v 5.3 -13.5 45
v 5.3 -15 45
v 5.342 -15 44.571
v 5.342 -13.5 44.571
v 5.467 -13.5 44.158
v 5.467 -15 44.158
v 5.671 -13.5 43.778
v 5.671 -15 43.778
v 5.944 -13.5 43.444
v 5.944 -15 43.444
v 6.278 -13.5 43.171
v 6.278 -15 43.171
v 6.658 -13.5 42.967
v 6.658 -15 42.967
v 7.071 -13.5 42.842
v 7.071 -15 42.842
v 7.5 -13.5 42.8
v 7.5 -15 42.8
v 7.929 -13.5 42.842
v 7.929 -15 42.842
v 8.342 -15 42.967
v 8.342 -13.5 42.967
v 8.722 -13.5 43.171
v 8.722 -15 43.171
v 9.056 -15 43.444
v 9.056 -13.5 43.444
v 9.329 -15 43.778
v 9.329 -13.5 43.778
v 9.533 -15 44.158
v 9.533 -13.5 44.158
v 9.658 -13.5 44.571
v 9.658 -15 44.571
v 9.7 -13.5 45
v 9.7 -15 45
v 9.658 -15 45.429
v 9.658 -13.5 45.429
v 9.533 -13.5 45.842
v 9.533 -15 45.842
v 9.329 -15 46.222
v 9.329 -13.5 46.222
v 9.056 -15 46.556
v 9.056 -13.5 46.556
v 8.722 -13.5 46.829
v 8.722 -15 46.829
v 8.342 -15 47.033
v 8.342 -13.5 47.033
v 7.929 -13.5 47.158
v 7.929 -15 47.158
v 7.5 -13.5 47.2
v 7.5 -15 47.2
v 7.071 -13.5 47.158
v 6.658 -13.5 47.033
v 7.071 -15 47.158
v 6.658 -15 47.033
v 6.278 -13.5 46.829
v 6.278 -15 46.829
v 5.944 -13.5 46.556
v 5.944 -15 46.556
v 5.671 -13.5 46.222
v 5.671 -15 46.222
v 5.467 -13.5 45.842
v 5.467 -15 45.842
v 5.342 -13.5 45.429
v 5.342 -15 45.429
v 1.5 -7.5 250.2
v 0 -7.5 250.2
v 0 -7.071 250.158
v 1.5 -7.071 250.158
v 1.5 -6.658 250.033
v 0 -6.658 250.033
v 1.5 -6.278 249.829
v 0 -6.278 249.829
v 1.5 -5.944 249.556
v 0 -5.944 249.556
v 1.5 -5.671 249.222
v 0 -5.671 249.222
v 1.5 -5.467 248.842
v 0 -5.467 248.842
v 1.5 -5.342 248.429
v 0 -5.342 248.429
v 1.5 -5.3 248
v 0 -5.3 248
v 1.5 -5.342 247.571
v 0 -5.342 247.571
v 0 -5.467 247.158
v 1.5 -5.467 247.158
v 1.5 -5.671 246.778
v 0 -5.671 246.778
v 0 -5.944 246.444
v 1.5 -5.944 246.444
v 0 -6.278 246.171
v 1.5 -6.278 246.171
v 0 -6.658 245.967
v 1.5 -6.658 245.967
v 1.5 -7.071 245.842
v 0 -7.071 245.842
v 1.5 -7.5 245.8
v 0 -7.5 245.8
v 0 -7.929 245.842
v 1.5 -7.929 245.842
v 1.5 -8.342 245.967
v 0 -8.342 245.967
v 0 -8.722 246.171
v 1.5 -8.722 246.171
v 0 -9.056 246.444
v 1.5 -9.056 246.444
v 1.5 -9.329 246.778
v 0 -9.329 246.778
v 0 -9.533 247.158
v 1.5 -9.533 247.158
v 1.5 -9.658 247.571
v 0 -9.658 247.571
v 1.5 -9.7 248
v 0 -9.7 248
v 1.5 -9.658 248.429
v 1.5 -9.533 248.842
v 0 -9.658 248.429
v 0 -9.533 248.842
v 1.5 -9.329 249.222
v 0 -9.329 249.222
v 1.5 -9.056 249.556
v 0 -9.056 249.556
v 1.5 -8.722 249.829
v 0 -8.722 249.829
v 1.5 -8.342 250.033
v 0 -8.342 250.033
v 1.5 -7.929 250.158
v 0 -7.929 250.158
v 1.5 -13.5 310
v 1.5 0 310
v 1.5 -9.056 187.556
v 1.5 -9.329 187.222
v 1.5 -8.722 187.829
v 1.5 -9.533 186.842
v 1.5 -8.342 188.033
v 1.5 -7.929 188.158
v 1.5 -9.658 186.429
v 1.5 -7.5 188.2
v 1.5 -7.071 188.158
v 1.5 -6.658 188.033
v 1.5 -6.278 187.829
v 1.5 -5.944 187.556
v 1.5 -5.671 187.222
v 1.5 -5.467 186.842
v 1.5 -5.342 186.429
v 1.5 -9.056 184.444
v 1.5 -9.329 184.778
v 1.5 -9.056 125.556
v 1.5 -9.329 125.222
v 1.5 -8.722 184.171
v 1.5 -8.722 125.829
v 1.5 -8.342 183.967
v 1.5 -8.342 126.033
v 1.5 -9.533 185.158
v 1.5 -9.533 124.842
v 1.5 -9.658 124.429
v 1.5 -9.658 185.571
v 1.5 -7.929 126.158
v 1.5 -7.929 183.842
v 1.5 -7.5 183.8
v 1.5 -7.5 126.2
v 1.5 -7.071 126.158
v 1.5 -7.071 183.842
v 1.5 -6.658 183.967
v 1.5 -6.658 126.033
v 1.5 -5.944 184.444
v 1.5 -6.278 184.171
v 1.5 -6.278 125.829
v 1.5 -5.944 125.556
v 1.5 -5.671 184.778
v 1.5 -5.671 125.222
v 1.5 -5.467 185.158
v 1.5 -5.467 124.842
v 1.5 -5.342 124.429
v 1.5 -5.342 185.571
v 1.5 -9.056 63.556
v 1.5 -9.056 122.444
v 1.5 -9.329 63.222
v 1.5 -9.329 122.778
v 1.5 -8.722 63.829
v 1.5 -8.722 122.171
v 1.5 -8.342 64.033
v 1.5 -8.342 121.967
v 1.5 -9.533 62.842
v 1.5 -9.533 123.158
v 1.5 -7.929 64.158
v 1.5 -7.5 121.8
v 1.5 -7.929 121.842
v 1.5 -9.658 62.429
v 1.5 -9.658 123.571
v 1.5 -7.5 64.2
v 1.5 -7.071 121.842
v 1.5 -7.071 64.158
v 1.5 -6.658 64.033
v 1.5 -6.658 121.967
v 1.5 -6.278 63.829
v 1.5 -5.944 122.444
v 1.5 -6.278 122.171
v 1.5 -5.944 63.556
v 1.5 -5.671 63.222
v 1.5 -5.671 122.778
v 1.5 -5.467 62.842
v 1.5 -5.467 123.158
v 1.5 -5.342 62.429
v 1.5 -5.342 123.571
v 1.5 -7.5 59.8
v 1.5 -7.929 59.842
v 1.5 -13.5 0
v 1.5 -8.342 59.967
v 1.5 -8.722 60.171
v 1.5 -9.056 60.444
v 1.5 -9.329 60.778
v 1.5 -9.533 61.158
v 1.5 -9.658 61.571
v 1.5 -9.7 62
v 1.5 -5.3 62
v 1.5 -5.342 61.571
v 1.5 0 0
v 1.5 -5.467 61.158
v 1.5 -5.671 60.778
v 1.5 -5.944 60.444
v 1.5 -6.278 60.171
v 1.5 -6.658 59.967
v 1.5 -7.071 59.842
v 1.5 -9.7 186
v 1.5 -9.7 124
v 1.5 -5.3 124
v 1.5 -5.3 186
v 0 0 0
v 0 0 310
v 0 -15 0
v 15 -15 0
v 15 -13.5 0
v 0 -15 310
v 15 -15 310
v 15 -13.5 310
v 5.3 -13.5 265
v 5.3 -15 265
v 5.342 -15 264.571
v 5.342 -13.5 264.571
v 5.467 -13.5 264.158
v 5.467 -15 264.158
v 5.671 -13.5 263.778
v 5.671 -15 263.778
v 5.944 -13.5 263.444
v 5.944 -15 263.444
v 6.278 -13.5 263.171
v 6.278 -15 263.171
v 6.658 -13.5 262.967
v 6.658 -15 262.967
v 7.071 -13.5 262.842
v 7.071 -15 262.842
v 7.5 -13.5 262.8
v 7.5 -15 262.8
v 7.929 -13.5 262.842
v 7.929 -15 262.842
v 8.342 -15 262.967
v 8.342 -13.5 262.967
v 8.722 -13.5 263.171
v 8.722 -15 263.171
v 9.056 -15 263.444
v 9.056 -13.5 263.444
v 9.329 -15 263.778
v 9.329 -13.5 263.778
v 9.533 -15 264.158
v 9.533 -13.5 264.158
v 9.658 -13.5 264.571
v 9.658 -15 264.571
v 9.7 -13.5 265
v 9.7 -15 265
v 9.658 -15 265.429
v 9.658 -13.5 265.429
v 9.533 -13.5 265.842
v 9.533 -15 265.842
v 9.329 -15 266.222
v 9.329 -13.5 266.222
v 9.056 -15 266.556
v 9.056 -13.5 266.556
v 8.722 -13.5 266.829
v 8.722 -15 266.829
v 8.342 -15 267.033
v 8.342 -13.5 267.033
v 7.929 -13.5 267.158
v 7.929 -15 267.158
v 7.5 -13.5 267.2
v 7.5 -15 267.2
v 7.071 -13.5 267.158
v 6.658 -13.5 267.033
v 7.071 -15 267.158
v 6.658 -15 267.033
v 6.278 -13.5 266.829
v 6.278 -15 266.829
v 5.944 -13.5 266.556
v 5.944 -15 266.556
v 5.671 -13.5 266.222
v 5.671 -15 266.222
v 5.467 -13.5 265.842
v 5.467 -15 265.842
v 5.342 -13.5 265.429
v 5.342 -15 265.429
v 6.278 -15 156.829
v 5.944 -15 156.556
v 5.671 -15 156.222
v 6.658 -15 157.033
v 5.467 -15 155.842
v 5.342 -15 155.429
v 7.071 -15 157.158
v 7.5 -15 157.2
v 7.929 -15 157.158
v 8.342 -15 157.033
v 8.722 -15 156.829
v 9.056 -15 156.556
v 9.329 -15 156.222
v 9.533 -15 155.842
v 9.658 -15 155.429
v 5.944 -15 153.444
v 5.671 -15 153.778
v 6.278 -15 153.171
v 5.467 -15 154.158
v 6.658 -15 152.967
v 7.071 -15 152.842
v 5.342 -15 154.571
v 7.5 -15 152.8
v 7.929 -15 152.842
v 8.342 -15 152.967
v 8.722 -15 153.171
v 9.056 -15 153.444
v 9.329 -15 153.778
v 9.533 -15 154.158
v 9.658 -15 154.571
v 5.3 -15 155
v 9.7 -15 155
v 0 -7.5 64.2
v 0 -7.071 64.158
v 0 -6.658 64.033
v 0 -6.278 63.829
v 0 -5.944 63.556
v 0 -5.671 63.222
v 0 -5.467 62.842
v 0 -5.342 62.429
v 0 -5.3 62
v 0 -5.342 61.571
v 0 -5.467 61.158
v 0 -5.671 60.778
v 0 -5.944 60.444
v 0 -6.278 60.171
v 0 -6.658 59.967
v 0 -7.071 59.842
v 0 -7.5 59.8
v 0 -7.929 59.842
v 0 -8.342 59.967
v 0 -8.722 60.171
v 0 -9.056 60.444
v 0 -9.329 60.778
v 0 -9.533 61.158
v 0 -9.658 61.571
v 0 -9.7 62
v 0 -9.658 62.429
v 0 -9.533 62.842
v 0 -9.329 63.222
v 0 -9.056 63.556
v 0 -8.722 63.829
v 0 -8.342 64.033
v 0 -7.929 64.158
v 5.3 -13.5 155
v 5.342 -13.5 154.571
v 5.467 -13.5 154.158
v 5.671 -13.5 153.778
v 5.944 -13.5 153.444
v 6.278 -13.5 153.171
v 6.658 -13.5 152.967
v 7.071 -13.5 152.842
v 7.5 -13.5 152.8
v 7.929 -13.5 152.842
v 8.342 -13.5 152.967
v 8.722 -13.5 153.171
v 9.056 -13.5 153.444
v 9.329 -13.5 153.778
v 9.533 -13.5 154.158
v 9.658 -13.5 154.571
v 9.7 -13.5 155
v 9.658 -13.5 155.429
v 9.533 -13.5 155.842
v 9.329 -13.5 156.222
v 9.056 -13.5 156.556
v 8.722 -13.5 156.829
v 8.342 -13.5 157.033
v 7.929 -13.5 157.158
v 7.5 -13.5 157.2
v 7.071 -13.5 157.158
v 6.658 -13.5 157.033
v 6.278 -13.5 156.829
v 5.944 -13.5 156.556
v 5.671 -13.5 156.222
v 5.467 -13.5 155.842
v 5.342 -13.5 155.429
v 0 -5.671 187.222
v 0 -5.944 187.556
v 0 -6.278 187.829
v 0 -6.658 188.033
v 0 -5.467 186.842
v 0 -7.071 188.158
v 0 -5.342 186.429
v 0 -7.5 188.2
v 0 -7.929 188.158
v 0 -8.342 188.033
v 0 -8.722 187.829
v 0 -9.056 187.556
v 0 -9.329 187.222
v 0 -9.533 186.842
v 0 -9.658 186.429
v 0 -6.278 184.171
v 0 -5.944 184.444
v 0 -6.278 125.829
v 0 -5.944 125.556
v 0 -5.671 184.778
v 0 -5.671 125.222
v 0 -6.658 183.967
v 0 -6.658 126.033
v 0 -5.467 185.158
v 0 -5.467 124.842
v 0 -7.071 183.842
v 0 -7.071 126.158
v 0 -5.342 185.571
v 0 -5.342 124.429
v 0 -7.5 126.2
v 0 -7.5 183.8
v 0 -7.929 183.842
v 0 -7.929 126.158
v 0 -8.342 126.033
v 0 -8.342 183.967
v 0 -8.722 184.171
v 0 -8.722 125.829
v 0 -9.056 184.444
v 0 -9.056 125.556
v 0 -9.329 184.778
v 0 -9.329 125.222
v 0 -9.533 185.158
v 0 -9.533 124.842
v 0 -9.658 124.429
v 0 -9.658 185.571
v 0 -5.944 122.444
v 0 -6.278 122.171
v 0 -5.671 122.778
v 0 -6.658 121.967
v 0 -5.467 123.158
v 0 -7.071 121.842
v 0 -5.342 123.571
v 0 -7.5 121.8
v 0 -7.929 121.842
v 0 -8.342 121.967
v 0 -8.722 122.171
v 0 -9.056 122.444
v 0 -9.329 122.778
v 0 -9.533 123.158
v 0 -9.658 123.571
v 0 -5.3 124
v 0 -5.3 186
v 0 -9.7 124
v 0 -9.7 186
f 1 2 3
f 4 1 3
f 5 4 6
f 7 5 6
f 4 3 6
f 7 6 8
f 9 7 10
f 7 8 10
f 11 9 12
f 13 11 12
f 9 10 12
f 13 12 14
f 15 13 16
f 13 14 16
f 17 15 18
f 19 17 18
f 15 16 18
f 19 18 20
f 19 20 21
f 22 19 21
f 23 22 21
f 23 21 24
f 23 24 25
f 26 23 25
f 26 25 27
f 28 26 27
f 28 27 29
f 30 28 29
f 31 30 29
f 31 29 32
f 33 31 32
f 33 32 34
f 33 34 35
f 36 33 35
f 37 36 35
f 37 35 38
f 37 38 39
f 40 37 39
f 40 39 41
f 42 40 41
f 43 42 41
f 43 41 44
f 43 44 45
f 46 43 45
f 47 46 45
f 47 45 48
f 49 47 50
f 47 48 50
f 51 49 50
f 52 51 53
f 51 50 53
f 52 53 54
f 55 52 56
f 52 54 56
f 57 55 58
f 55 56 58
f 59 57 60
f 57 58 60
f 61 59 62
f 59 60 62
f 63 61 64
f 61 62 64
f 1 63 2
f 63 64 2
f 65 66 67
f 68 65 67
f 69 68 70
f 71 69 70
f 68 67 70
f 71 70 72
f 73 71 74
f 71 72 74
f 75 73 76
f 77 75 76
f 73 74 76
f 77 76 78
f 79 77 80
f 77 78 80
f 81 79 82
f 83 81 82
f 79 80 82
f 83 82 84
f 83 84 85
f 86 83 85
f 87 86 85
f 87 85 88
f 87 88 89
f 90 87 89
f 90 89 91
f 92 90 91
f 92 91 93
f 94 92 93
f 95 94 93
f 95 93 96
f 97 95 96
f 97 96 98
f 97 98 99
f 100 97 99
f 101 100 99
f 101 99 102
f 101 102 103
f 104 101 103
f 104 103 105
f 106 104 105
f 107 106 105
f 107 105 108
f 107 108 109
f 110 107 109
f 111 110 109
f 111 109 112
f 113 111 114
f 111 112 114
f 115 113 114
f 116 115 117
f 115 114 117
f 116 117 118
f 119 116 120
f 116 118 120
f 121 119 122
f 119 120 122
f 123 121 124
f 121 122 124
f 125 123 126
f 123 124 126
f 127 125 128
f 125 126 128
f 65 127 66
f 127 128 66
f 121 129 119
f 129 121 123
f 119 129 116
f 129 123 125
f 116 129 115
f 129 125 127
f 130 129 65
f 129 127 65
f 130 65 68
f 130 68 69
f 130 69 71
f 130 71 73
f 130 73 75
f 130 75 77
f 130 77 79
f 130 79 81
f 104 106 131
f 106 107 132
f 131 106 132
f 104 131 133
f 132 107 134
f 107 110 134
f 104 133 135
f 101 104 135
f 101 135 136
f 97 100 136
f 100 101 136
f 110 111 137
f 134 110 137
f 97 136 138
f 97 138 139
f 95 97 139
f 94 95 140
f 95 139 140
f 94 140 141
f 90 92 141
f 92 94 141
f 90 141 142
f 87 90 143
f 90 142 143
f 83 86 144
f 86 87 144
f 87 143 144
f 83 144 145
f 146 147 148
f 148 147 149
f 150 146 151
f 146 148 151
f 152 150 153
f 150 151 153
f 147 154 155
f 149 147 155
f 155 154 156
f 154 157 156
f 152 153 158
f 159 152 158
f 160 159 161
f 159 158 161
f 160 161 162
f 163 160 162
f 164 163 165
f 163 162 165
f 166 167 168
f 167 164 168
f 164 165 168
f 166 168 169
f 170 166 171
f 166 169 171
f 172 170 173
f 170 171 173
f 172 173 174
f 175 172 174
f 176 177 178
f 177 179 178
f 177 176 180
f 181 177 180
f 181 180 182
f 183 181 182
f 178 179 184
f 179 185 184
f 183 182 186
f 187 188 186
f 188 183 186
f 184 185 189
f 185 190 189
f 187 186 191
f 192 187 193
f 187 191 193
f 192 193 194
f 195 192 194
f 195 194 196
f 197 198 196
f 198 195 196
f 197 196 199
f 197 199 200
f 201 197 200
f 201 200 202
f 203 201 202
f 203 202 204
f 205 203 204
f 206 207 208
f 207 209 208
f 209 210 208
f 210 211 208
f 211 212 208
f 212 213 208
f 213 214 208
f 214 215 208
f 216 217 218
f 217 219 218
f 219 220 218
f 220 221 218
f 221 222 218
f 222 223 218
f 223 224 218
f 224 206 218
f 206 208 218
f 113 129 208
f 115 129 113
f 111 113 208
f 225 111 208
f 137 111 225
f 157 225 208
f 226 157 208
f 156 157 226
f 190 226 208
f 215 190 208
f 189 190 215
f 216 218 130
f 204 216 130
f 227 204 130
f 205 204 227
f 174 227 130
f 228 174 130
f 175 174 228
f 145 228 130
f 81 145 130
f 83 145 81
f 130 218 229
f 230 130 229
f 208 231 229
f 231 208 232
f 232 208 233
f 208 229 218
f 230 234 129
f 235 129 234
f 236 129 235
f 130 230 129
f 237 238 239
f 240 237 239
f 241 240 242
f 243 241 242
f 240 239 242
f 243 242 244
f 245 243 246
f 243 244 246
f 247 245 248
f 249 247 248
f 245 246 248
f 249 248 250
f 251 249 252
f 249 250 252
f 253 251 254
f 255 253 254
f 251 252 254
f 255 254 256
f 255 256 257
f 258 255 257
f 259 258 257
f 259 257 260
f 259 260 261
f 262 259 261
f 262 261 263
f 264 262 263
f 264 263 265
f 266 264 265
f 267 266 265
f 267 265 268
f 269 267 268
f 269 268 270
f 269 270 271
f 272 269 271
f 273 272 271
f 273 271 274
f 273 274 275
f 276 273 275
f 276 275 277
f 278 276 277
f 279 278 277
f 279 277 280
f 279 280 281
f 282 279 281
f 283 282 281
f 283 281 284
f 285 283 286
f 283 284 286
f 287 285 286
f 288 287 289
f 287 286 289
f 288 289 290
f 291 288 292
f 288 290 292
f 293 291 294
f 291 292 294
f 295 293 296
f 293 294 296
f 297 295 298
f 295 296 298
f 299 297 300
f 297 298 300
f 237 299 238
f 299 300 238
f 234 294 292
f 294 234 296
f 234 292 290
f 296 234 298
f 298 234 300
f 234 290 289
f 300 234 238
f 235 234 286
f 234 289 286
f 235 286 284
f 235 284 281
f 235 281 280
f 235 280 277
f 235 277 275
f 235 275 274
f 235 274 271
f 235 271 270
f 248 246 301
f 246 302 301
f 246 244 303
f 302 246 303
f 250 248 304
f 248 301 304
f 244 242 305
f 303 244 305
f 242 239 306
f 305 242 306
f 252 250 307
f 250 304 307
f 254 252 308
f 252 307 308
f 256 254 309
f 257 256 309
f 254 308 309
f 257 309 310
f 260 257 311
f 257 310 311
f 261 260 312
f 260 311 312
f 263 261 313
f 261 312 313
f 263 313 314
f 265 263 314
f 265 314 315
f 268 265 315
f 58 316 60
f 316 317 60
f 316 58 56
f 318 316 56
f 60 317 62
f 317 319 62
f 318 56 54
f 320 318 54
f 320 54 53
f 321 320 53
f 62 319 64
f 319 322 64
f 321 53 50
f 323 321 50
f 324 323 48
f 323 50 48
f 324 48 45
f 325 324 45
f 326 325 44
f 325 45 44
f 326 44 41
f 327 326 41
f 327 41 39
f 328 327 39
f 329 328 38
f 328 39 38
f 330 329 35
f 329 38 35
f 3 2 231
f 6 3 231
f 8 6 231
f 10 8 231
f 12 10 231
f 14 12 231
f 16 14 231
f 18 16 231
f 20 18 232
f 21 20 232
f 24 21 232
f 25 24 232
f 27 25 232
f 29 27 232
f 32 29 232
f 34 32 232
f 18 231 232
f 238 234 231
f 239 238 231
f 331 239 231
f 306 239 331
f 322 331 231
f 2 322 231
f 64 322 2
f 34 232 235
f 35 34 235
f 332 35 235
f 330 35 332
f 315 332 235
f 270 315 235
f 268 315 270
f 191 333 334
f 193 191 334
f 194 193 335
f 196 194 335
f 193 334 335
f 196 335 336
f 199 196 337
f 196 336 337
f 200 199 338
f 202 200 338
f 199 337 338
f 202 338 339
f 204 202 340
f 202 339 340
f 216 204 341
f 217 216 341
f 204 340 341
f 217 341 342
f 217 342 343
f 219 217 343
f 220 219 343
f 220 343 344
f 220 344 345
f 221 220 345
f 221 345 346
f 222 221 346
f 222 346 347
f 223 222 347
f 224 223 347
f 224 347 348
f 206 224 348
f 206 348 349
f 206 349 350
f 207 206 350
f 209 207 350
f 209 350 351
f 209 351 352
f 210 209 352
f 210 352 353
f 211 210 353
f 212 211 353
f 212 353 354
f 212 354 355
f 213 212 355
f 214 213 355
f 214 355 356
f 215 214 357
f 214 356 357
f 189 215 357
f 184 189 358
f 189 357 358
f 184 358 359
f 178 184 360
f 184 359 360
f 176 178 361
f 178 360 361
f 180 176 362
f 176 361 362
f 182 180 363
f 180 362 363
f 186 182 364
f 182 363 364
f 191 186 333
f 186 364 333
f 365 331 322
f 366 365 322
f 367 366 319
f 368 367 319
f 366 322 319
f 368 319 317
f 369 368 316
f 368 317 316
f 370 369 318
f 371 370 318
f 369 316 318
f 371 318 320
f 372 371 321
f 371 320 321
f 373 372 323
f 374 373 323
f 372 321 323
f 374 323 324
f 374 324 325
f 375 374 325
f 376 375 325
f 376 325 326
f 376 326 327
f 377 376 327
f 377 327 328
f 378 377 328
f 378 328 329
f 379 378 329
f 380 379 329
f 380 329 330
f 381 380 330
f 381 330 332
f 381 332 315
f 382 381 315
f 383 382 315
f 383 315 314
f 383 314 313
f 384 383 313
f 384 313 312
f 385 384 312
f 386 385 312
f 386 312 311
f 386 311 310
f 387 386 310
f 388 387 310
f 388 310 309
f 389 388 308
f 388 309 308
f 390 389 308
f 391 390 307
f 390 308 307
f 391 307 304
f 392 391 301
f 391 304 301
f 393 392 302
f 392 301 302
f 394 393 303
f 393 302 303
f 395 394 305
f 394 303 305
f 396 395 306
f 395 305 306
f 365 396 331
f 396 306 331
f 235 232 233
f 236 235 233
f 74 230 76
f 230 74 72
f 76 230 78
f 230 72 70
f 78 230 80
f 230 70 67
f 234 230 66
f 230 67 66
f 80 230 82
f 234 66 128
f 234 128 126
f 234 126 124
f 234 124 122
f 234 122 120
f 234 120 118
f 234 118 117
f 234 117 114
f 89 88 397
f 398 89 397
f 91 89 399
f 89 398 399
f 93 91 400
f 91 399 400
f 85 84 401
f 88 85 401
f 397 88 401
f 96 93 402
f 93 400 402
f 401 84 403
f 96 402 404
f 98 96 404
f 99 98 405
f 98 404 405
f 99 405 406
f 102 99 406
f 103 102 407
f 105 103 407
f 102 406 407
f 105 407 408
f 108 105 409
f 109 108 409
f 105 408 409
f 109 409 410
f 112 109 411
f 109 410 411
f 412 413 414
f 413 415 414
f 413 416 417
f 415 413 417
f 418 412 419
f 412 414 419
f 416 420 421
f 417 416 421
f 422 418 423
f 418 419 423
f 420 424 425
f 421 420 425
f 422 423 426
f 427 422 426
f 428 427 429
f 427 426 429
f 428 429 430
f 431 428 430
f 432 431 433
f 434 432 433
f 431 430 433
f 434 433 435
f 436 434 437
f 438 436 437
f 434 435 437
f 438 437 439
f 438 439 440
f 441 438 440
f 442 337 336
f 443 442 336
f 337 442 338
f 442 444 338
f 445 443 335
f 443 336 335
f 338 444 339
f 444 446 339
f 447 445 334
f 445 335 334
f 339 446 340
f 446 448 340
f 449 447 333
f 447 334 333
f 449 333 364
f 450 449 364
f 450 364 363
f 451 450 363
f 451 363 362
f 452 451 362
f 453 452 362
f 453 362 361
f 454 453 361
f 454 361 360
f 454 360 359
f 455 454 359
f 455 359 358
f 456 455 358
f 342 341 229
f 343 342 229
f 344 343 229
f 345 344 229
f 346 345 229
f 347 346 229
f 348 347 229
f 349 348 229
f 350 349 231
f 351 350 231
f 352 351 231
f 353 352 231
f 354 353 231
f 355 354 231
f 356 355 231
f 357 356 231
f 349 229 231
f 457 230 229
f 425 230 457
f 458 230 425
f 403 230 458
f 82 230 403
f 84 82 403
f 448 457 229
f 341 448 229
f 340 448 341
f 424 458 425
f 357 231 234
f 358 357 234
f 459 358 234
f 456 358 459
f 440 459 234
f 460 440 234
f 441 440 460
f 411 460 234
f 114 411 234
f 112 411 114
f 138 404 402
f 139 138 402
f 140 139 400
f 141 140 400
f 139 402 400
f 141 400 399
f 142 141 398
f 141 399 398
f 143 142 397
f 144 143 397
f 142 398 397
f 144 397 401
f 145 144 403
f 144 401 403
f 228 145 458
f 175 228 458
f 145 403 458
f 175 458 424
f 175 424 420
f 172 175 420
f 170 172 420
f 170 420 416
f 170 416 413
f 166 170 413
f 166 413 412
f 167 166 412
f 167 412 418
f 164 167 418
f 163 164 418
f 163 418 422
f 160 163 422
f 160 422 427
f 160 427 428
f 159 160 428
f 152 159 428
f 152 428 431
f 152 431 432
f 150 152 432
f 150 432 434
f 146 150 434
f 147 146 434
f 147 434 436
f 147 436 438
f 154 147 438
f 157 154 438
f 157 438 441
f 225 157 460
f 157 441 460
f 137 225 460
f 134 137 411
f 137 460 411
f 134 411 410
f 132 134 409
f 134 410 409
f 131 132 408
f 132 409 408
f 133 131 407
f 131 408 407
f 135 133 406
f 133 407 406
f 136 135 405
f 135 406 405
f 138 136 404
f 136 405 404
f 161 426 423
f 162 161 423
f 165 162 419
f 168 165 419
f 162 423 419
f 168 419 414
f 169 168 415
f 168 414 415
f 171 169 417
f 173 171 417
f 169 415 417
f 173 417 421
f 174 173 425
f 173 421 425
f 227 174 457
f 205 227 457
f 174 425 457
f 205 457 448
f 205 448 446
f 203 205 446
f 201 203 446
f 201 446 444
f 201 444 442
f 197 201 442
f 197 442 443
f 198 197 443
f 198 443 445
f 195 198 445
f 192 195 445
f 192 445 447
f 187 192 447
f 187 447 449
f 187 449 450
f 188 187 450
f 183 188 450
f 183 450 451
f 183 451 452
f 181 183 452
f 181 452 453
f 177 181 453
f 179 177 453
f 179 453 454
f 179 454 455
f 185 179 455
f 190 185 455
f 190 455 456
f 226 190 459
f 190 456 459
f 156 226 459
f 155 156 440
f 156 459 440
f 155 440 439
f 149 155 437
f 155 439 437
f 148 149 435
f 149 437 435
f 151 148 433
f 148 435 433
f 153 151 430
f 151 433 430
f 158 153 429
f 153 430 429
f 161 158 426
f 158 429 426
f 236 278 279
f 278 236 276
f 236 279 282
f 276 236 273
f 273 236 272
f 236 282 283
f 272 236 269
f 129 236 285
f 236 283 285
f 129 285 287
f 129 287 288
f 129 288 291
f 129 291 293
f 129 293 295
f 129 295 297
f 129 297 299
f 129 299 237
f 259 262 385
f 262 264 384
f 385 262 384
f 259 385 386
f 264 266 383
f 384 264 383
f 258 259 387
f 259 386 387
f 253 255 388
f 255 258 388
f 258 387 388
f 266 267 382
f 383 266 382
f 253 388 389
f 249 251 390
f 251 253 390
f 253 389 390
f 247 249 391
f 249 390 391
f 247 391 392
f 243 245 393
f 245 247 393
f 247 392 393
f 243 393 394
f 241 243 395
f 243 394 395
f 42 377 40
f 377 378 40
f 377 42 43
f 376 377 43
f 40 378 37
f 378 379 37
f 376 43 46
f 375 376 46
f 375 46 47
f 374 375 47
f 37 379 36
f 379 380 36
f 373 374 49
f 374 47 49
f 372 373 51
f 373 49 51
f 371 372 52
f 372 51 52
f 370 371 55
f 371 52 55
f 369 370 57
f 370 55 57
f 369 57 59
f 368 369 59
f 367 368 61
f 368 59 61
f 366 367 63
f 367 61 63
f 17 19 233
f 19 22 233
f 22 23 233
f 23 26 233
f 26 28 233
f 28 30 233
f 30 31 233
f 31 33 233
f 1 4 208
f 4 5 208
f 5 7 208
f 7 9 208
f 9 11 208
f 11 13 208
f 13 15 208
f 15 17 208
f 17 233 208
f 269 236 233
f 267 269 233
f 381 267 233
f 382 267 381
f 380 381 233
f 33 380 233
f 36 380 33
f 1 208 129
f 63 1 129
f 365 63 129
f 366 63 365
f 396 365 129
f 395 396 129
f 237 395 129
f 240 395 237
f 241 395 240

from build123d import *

# Parameters (mm, degrees)
EXTRUDE_1_DEPTH     = 310
SKETCH_2_R          = 2.2
CUT_EXTRUDE_1_DEPTH = 310
SKETCH_3_R          = 2.2
CUT_EXTRUDE_2_DEPTH = 160


with BuildPart() as part:
    # ｽｹｯﾁ1 → ﾎﾞｽ - 押し出し1 (new body)
    with BuildSketch(Plane.XY):
        Polygon((0, 0), (0, -15), (15, -15), (15, -13.5), (1.5, -13.5), (1.5, 0), align=None)
    extrude(amount=EXTRUDE_1_DEPTH)

    # ｽｹｯﾁ2 → ｶｯﾄ - 押し出し1 (cut)
    with BuildSketch(Plane.ZY):
        with Locations((248, -7.5)):
            Circle(SKETCH_2_R)
        with Locations((186, -7.5)):
            Circle(SKETCH_2_R)
        with Locations((124, -7.5)):
            Circle(SKETCH_2_R)
        with Locations((62, -7.5)):
            Circle(SKETCH_2_R)
    extrude(amount=-CUT_EXTRUDE_1_DEPTH, mode=Mode.SUBTRACT)

    # ｽｹｯﾁ3 → ｶｯﾄ - 押し出し2 (cut)
    with BuildSketch(Plane(origin=(0, -15, 0), x_dir=(-1, 0, 0), z_dir=(0, -1, 0))):
        with Locations((-7.5, -265)):
            Circle(SKETCH_3_R)
        with Locations((-7.5, -155)):
            Circle(SKETCH_3_R)
        with Locations((-7.5, -45)):
            Circle(SKETCH_3_R)
    extrude(amount=-CUT_EXTRUDE_2_DEPTH, mode=Mode.SUBTRACT)


solid = part.part
